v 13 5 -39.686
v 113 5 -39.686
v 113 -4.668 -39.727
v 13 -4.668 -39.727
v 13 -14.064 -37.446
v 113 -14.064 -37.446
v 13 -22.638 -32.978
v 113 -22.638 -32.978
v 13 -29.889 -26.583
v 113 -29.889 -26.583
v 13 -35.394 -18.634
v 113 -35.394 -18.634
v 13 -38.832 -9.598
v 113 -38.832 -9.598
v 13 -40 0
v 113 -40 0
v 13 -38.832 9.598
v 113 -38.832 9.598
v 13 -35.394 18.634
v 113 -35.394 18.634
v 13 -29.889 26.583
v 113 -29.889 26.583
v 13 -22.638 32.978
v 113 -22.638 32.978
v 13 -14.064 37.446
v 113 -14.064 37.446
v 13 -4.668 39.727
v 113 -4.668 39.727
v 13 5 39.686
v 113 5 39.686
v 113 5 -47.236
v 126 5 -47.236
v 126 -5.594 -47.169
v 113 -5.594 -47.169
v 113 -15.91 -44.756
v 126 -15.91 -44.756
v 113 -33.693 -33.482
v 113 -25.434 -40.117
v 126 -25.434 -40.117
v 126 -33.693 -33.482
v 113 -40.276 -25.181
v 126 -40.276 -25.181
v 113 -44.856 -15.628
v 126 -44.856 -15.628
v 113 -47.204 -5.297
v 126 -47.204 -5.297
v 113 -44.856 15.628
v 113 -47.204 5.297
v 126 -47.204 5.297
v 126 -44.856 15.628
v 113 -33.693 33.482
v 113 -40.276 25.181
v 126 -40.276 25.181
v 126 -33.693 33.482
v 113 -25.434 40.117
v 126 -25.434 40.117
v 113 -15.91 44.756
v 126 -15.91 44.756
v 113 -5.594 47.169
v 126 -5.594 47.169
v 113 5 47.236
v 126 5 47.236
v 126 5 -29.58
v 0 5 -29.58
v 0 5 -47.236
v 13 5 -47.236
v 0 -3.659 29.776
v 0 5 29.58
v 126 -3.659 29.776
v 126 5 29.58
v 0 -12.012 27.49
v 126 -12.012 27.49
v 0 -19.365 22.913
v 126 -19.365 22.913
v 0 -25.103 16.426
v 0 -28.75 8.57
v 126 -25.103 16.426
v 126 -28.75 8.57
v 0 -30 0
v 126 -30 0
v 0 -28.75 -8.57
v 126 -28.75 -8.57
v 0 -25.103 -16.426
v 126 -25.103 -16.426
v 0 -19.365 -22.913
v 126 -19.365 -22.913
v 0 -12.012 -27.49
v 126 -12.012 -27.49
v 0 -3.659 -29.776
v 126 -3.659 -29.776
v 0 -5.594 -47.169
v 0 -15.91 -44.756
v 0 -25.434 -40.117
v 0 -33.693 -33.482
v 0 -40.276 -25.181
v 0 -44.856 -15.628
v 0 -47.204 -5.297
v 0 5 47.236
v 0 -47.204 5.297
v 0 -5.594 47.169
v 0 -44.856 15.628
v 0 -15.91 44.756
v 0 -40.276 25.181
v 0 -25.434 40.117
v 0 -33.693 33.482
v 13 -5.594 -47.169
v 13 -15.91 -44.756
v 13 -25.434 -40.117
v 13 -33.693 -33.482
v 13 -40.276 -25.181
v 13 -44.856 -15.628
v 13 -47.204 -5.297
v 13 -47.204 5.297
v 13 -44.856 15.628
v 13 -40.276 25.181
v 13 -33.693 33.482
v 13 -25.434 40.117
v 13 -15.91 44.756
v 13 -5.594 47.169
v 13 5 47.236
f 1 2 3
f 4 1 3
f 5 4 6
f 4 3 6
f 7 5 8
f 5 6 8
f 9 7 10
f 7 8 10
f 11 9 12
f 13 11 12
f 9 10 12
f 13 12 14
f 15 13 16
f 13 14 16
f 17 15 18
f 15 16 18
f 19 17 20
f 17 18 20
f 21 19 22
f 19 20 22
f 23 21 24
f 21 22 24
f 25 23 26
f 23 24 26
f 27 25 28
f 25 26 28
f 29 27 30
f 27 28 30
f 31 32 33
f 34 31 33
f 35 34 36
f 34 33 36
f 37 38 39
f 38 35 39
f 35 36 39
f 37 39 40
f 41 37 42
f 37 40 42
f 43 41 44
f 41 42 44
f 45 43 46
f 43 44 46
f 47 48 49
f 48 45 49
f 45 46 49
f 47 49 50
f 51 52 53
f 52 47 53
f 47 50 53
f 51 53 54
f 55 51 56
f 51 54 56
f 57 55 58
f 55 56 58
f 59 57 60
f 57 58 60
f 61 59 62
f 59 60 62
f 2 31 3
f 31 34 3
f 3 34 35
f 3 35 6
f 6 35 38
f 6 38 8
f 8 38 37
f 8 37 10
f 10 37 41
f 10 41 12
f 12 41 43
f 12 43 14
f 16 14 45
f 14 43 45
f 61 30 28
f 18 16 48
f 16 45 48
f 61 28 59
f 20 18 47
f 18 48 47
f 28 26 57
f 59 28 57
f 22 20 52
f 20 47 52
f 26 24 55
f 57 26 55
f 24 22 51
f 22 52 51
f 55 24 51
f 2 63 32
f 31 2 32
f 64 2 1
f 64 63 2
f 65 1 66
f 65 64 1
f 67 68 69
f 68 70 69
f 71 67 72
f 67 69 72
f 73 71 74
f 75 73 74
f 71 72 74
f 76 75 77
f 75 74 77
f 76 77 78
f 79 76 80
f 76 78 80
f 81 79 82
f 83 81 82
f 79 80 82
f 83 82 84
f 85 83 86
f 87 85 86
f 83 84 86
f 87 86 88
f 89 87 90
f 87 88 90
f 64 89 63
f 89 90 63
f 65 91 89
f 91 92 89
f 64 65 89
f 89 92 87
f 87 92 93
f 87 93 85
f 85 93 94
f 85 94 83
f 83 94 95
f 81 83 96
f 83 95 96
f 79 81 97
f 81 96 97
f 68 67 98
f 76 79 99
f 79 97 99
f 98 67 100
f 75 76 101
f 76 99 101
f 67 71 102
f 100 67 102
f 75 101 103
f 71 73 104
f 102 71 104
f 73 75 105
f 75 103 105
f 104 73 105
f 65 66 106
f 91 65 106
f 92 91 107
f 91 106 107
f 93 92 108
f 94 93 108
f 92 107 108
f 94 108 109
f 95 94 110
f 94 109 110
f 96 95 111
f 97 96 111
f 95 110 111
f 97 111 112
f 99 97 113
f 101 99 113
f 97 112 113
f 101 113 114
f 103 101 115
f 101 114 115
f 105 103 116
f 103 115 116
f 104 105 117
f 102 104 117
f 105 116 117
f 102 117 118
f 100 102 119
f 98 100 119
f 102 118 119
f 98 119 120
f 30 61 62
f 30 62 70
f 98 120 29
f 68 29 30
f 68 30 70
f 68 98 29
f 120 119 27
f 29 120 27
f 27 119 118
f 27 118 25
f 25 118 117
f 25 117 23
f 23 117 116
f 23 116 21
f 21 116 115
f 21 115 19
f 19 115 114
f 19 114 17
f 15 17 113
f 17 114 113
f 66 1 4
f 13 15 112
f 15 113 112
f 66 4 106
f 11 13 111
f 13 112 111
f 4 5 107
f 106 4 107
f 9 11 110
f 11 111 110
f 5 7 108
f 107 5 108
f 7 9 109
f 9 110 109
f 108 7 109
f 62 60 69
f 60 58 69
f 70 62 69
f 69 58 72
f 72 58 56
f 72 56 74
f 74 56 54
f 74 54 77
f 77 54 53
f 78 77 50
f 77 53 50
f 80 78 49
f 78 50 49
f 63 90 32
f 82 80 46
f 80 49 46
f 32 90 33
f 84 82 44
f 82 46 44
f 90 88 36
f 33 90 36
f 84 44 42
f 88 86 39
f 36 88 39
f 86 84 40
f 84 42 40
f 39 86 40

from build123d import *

# Parameters (mm, degrees)
SKETCH2_R                   = 30
CUT_EXTRUDE1_DEPTH          = 143.788304843
BOSS_EXTRUDE1_REACH         = 164.242
BOSS_EXTRUDE1_END_RADIUS    = 40
SKETCH3_R                   = 8
M10X1_0_TAPPED_HOLE1_REACH  = 164.242
M10X1_0_TAPPED_HOLE1_BORE_R = 4.5
CUT_EXTRUDE2_DEPTH          = 143.788304931
CUT_EXTRUDE2_DEPTH_BACK     = 143.788304931


with BuildPart() as part:
    # Sketch1 → Revolve1 (revolve)
    with BuildSketch(Plane.XY, mode=Mode.PRIVATE) as revolve1_sk:
        Polygon((0, 0), (0, 47.5), (13, 47.5), (13, 40), (113, 40), (113, 47.5), (126, 47.5), (126, 0), align=None)
    revolve(revolve1_sk.sketch.rotate(Axis((126, 0, 0), (-1, 0, 0)), 90), axis=Axis((126, 0, 0), (-1, 0, 0)))

    # Sketch2 → Cut-Extrude1 (cut, through all)
    with BuildSketch(Plane(origin=(126, 0, 0), x_dir=(0, 0, -1), z_dir=(1, 0, 0))):
        Circle(SKETCH2_R)
    extrude(amount=-CUT_EXTRUDE1_DEPTH, mode=Mode.SUBTRACT)

    # Boss-Extrude1: up to this cylinder (the profile starts outside it)
    boss_extrude1_end = Plane(origin=(63, 0, 0), z_dir=(1, 0, 0)) * Cylinder(BOSS_EXTRUDE1_END_RADIUS, 409.484, mode=Mode.PRIVATE)
    # Sketch3 → Boss-Extrude1 (add, up to the surface)
    with BuildSketch(Plane(origin=(0, 43, 0), x_dir=(1, 0, 0), z_dir=(0, 1, 0)), mode=Mode.PRIVATE) as boss_extrude1_sk1:
        with Locations(Location((63, 0, 0), (0, 0, 270))):
            Circle(SKETCH3_R)
    boss_extrude1_tool1 = extrude(boss_extrude1_sk1.sketch, amount=-BOSS_EXTRUDE1_REACH, mode=Mode.PRIVATE) - boss_extrude1_end
    add(boss_extrude1_tool1.solids().sort_by_distance((63, 43, 0))[0])

    # M10x1.0 Tapped Hole1 bore → M10x1.0 Tapped Hole1 (cut, up to next)
    with BuildSketch(Plane(origin=(0, 43, 0), x_dir=(1, 0, 0), z_dir=(0, 1, 0)), mode=Mode.PRIVATE) as m10x1_0_tapped_hole1_sk1:
        with Locations((63, 0)):
            Circle(M10X1_0_TAPPED_HOLE1_BORE_R)
    m10x1_0_tapped_hole1_tool1 = extrude(m10x1_0_tapped_hole1_sk1.sketch, amount=-M10X1_0_TAPPED_HOLE1_REACH, mode=Mode.PRIVATE) & part.part
    add(m10x1_0_tapped_hole1_tool1.solids().sort_by_distance((63, 43, 0))[0], mode=Mode.SUBTRACT)

    # Sketch6 → Cut-Extrude2 (cut, two sides: drawn at the far end of the back side and taken through both)
    with BuildSketch(Plane(origin=(126, 0, 0), x_dir=(0, 0, -1), z_dir=(1, 0, 0)).offset(-CUT_EXTRUDE2_DEPTH_BACK)):
        Polygon((-315.109988933, 5), (-62.08548164, 5), (59.692601542, 5), (312.717108835, 5), (312.717108835, 511.049014586), (-315.109988933, 511.049014586), align=None)
    extrude(amount=CUT_EXTRUDE2_DEPTH + CUT_EXTRUDE2_DEPTH_BACK, mode=Mode.SUBTRACT)


solid = part.part
